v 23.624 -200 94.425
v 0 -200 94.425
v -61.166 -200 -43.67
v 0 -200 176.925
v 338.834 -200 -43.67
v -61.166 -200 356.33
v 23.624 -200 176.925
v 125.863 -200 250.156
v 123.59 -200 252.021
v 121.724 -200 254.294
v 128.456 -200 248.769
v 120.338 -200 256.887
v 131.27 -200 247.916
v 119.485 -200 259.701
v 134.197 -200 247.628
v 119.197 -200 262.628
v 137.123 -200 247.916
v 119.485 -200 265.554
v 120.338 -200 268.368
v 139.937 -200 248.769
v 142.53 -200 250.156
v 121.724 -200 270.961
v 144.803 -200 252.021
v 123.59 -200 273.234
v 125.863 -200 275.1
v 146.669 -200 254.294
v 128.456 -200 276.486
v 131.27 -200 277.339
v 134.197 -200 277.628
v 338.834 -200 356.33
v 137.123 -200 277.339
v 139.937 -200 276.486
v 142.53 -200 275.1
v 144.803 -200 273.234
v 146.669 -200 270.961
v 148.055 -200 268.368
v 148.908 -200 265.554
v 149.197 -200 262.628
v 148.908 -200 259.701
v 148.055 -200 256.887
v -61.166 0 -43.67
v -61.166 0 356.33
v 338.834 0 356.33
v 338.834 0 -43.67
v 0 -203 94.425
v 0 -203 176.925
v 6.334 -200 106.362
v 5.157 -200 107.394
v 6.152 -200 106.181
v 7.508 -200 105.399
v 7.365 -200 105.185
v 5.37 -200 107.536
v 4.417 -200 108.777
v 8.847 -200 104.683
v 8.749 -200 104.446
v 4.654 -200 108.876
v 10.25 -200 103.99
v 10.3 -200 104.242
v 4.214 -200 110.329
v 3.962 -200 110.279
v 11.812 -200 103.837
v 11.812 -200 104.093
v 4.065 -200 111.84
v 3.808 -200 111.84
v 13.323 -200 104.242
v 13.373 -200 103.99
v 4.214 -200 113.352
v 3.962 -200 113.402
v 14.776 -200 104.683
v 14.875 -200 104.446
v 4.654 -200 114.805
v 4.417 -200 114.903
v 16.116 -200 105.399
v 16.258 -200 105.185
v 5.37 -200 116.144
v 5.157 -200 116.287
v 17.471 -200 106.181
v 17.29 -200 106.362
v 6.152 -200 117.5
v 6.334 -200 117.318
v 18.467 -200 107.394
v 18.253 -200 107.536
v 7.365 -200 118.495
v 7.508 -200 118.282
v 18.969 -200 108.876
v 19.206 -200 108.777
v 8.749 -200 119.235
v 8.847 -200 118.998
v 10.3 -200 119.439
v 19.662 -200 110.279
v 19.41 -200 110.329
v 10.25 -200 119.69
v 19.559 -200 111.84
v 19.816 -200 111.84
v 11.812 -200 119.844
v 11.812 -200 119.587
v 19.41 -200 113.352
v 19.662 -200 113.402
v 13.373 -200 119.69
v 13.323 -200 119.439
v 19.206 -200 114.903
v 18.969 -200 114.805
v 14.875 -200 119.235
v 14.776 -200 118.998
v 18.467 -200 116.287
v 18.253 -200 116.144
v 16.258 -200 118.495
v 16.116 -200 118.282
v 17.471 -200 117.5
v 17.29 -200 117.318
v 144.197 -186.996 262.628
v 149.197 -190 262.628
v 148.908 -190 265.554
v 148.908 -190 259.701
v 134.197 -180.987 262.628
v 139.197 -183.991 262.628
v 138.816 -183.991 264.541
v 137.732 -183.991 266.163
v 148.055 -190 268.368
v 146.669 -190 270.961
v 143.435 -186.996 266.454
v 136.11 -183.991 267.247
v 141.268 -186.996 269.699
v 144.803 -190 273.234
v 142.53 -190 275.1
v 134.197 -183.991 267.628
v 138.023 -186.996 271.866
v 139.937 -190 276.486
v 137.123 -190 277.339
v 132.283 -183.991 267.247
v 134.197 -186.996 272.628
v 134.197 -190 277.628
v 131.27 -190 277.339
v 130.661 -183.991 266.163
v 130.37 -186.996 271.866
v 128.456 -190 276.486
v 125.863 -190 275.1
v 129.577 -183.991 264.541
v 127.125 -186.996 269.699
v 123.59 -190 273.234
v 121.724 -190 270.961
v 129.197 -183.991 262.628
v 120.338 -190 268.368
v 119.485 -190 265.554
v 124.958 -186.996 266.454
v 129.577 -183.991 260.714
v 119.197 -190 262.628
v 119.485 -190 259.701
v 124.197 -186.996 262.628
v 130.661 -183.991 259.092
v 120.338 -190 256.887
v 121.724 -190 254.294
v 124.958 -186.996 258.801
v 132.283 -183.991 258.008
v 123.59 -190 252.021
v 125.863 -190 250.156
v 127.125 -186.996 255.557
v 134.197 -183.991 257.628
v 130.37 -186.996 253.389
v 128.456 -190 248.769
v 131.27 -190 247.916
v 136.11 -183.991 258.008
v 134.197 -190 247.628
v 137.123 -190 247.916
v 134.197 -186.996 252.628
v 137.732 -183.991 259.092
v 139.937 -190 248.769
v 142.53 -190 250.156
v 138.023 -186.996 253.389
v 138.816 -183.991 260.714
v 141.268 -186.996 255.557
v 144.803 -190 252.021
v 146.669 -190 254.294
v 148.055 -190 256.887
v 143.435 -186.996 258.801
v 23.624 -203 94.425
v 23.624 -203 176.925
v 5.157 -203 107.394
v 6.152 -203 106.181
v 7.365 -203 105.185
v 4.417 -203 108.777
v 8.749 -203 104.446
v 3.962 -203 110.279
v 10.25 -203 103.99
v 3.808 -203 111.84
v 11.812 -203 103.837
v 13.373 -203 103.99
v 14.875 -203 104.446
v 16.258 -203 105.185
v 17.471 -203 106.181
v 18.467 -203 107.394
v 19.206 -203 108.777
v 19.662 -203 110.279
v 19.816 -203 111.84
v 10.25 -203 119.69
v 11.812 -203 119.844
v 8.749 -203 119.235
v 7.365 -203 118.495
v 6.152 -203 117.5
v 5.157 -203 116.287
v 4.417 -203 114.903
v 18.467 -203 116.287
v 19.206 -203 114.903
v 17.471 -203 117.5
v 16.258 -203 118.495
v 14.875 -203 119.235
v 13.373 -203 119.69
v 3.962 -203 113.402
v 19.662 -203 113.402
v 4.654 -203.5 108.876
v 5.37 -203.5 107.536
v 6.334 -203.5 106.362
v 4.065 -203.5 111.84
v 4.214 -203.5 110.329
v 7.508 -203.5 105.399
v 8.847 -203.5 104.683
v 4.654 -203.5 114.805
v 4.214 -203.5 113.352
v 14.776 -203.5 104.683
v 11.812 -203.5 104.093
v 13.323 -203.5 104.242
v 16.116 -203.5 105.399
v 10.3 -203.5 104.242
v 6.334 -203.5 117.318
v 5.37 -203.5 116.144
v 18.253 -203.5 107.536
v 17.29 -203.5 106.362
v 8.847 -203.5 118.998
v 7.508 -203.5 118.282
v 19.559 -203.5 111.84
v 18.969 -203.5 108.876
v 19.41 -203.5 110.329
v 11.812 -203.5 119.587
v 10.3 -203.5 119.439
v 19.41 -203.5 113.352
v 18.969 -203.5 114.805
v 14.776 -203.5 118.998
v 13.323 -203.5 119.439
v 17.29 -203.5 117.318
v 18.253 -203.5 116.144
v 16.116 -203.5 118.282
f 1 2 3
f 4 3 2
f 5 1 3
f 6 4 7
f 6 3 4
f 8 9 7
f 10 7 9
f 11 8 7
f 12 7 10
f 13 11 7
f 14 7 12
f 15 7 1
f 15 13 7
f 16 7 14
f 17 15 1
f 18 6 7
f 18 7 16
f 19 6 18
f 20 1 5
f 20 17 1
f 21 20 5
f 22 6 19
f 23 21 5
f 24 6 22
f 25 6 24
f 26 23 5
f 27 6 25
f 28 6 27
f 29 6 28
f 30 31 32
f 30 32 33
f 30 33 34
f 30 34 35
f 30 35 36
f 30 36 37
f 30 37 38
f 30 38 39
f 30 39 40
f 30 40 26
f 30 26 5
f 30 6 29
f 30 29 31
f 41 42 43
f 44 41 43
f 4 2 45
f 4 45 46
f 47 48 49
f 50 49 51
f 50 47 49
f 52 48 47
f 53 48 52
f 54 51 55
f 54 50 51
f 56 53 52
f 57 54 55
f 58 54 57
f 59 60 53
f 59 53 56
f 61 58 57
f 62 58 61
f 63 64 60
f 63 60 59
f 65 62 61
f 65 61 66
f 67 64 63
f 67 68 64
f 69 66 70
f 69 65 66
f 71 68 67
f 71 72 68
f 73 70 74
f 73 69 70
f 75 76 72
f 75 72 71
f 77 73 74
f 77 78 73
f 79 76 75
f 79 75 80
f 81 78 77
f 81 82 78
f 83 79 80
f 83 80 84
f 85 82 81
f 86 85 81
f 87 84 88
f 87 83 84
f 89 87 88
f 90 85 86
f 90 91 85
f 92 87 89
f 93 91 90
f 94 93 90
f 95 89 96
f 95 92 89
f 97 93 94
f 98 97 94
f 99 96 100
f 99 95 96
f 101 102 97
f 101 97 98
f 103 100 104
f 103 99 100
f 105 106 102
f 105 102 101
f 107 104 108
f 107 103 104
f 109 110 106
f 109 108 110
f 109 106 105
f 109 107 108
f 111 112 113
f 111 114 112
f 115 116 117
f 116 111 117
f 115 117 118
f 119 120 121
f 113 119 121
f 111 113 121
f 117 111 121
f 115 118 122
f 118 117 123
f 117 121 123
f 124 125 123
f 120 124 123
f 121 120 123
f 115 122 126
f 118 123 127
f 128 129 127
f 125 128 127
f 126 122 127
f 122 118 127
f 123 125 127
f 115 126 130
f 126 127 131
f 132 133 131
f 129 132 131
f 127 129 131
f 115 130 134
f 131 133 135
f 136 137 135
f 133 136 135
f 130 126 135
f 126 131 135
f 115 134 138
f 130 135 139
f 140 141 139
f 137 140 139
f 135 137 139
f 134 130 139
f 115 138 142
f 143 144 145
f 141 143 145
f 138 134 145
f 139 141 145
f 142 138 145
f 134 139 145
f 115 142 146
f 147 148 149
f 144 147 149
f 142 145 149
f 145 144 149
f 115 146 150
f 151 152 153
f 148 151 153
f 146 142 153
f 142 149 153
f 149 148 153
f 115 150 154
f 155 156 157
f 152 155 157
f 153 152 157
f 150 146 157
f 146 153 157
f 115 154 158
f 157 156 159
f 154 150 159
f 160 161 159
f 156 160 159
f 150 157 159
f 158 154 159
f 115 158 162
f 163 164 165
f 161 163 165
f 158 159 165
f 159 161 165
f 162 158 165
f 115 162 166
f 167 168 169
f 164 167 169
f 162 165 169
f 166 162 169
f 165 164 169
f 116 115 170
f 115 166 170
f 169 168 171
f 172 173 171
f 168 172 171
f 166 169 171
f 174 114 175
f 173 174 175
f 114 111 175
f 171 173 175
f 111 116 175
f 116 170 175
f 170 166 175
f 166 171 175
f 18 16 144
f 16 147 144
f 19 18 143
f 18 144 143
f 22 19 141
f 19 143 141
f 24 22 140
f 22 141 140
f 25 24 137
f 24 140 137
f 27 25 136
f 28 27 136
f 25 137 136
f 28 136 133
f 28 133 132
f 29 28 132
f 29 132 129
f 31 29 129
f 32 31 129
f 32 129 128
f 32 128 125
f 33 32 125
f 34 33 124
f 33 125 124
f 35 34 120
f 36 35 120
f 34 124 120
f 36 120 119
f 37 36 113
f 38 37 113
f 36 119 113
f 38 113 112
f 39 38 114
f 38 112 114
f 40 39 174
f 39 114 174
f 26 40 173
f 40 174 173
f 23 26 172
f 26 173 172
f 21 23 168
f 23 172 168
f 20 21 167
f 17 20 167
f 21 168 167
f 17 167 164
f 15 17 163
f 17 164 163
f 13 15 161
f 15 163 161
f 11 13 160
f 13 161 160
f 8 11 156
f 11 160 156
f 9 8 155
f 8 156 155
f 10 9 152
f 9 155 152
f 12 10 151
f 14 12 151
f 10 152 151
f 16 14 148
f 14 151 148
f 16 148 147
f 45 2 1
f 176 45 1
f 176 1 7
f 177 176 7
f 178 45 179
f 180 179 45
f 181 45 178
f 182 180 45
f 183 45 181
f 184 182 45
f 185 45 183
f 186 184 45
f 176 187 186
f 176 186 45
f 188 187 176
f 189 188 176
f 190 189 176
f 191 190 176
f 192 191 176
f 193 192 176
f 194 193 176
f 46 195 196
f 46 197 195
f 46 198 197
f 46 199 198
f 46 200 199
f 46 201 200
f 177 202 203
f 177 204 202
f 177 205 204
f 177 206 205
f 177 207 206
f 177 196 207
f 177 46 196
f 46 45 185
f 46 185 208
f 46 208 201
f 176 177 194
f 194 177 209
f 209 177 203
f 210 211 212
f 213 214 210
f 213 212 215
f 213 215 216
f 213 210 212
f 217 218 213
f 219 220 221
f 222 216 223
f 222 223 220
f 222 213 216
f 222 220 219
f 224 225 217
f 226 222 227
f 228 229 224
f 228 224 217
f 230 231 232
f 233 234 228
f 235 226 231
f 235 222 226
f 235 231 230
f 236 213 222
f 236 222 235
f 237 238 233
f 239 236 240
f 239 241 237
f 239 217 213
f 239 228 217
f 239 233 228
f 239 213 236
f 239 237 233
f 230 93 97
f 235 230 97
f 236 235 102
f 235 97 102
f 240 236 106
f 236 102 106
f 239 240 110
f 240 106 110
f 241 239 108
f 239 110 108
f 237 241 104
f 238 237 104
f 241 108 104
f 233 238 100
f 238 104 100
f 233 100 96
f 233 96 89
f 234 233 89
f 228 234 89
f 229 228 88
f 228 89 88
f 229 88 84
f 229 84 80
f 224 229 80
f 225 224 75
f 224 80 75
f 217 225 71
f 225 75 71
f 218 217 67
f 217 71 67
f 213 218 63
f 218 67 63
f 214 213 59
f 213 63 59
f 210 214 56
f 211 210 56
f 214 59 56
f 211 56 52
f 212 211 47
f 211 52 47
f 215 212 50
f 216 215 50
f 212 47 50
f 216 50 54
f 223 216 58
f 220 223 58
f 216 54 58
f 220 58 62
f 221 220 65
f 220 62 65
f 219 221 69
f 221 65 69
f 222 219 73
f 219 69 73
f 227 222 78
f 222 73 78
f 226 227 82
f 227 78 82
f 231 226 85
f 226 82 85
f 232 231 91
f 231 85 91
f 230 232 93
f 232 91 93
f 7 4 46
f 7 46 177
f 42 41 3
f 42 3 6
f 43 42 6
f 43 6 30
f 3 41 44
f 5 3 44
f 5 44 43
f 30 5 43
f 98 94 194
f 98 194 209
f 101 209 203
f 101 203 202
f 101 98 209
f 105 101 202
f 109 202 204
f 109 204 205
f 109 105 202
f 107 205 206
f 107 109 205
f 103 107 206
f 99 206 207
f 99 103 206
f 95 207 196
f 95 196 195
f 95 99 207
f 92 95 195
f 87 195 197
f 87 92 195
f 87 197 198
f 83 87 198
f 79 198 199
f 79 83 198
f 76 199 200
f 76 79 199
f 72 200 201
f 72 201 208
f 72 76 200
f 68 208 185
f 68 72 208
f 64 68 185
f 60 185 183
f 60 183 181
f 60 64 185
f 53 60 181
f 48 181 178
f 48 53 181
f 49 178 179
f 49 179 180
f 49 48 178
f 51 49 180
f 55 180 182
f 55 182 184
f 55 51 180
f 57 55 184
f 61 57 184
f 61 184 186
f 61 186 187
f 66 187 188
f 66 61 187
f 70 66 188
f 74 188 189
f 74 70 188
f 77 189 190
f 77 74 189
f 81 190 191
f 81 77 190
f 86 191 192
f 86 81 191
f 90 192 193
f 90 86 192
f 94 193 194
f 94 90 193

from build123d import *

# Parameters (mm, degrees)
F0_W     = 400
F0_H     = 400
F1_DEPTH = 200
F2_W     = 23.6235832693
F2_H     = 82.5
F2_R     = 8.0037412027
F3_DEPTH = 3
F2_R_2   = 7.7471341156
F4_DEPTH = 3.5
F6_D     = 30
F6_DEPTH = 10
F6_TIP   = 9.0129092854


with BuildPart() as f1:
    # F0 (on Front) → F1 (new body)
    with BuildSketch(Plane.XZ):
        with Locations((138.8336762786, 156.3295841217)):
            Rectangle(F0_W, F0_H)
    extrude(amount=F1_DEPTH)

    # F2 (on face) → F3 (join)
    with BuildSketch(Plane.XZ.offset(200)):
        with Locations((11.8117916346, 135.6753641114)):
            Rectangle(F2_W, F2_H)
        with Locations((11.8117916346, 111.8402481079)):
            Circle(F2_R, mode=Mode.SUBTRACT)
    extrude(amount=F3_DEPTH)

    # F2 (on face) → F4 (join)
    with BuildSketch(Plane.XZ.offset(200)):
        with Locations((11.8117916346, 111.8402481079)):
            Circle(F2_R_2)
    extrude(amount=F4_DEPTH)

    # F6
    with Locations(Plane.XZ.offset(200)):
        with Locations((134.1965198517, 262.6275718212)):
            Hole(F6_D / 2, depth=F6_DEPTH)
            with Locations((0, 0, -(F6_DEPTH + F6_TIP / 2))):  # 118° drill point
                Cone(0, F6_D / 2, F6_TIP, mode=Mode.SUBTRACT)


solid = f1.part
